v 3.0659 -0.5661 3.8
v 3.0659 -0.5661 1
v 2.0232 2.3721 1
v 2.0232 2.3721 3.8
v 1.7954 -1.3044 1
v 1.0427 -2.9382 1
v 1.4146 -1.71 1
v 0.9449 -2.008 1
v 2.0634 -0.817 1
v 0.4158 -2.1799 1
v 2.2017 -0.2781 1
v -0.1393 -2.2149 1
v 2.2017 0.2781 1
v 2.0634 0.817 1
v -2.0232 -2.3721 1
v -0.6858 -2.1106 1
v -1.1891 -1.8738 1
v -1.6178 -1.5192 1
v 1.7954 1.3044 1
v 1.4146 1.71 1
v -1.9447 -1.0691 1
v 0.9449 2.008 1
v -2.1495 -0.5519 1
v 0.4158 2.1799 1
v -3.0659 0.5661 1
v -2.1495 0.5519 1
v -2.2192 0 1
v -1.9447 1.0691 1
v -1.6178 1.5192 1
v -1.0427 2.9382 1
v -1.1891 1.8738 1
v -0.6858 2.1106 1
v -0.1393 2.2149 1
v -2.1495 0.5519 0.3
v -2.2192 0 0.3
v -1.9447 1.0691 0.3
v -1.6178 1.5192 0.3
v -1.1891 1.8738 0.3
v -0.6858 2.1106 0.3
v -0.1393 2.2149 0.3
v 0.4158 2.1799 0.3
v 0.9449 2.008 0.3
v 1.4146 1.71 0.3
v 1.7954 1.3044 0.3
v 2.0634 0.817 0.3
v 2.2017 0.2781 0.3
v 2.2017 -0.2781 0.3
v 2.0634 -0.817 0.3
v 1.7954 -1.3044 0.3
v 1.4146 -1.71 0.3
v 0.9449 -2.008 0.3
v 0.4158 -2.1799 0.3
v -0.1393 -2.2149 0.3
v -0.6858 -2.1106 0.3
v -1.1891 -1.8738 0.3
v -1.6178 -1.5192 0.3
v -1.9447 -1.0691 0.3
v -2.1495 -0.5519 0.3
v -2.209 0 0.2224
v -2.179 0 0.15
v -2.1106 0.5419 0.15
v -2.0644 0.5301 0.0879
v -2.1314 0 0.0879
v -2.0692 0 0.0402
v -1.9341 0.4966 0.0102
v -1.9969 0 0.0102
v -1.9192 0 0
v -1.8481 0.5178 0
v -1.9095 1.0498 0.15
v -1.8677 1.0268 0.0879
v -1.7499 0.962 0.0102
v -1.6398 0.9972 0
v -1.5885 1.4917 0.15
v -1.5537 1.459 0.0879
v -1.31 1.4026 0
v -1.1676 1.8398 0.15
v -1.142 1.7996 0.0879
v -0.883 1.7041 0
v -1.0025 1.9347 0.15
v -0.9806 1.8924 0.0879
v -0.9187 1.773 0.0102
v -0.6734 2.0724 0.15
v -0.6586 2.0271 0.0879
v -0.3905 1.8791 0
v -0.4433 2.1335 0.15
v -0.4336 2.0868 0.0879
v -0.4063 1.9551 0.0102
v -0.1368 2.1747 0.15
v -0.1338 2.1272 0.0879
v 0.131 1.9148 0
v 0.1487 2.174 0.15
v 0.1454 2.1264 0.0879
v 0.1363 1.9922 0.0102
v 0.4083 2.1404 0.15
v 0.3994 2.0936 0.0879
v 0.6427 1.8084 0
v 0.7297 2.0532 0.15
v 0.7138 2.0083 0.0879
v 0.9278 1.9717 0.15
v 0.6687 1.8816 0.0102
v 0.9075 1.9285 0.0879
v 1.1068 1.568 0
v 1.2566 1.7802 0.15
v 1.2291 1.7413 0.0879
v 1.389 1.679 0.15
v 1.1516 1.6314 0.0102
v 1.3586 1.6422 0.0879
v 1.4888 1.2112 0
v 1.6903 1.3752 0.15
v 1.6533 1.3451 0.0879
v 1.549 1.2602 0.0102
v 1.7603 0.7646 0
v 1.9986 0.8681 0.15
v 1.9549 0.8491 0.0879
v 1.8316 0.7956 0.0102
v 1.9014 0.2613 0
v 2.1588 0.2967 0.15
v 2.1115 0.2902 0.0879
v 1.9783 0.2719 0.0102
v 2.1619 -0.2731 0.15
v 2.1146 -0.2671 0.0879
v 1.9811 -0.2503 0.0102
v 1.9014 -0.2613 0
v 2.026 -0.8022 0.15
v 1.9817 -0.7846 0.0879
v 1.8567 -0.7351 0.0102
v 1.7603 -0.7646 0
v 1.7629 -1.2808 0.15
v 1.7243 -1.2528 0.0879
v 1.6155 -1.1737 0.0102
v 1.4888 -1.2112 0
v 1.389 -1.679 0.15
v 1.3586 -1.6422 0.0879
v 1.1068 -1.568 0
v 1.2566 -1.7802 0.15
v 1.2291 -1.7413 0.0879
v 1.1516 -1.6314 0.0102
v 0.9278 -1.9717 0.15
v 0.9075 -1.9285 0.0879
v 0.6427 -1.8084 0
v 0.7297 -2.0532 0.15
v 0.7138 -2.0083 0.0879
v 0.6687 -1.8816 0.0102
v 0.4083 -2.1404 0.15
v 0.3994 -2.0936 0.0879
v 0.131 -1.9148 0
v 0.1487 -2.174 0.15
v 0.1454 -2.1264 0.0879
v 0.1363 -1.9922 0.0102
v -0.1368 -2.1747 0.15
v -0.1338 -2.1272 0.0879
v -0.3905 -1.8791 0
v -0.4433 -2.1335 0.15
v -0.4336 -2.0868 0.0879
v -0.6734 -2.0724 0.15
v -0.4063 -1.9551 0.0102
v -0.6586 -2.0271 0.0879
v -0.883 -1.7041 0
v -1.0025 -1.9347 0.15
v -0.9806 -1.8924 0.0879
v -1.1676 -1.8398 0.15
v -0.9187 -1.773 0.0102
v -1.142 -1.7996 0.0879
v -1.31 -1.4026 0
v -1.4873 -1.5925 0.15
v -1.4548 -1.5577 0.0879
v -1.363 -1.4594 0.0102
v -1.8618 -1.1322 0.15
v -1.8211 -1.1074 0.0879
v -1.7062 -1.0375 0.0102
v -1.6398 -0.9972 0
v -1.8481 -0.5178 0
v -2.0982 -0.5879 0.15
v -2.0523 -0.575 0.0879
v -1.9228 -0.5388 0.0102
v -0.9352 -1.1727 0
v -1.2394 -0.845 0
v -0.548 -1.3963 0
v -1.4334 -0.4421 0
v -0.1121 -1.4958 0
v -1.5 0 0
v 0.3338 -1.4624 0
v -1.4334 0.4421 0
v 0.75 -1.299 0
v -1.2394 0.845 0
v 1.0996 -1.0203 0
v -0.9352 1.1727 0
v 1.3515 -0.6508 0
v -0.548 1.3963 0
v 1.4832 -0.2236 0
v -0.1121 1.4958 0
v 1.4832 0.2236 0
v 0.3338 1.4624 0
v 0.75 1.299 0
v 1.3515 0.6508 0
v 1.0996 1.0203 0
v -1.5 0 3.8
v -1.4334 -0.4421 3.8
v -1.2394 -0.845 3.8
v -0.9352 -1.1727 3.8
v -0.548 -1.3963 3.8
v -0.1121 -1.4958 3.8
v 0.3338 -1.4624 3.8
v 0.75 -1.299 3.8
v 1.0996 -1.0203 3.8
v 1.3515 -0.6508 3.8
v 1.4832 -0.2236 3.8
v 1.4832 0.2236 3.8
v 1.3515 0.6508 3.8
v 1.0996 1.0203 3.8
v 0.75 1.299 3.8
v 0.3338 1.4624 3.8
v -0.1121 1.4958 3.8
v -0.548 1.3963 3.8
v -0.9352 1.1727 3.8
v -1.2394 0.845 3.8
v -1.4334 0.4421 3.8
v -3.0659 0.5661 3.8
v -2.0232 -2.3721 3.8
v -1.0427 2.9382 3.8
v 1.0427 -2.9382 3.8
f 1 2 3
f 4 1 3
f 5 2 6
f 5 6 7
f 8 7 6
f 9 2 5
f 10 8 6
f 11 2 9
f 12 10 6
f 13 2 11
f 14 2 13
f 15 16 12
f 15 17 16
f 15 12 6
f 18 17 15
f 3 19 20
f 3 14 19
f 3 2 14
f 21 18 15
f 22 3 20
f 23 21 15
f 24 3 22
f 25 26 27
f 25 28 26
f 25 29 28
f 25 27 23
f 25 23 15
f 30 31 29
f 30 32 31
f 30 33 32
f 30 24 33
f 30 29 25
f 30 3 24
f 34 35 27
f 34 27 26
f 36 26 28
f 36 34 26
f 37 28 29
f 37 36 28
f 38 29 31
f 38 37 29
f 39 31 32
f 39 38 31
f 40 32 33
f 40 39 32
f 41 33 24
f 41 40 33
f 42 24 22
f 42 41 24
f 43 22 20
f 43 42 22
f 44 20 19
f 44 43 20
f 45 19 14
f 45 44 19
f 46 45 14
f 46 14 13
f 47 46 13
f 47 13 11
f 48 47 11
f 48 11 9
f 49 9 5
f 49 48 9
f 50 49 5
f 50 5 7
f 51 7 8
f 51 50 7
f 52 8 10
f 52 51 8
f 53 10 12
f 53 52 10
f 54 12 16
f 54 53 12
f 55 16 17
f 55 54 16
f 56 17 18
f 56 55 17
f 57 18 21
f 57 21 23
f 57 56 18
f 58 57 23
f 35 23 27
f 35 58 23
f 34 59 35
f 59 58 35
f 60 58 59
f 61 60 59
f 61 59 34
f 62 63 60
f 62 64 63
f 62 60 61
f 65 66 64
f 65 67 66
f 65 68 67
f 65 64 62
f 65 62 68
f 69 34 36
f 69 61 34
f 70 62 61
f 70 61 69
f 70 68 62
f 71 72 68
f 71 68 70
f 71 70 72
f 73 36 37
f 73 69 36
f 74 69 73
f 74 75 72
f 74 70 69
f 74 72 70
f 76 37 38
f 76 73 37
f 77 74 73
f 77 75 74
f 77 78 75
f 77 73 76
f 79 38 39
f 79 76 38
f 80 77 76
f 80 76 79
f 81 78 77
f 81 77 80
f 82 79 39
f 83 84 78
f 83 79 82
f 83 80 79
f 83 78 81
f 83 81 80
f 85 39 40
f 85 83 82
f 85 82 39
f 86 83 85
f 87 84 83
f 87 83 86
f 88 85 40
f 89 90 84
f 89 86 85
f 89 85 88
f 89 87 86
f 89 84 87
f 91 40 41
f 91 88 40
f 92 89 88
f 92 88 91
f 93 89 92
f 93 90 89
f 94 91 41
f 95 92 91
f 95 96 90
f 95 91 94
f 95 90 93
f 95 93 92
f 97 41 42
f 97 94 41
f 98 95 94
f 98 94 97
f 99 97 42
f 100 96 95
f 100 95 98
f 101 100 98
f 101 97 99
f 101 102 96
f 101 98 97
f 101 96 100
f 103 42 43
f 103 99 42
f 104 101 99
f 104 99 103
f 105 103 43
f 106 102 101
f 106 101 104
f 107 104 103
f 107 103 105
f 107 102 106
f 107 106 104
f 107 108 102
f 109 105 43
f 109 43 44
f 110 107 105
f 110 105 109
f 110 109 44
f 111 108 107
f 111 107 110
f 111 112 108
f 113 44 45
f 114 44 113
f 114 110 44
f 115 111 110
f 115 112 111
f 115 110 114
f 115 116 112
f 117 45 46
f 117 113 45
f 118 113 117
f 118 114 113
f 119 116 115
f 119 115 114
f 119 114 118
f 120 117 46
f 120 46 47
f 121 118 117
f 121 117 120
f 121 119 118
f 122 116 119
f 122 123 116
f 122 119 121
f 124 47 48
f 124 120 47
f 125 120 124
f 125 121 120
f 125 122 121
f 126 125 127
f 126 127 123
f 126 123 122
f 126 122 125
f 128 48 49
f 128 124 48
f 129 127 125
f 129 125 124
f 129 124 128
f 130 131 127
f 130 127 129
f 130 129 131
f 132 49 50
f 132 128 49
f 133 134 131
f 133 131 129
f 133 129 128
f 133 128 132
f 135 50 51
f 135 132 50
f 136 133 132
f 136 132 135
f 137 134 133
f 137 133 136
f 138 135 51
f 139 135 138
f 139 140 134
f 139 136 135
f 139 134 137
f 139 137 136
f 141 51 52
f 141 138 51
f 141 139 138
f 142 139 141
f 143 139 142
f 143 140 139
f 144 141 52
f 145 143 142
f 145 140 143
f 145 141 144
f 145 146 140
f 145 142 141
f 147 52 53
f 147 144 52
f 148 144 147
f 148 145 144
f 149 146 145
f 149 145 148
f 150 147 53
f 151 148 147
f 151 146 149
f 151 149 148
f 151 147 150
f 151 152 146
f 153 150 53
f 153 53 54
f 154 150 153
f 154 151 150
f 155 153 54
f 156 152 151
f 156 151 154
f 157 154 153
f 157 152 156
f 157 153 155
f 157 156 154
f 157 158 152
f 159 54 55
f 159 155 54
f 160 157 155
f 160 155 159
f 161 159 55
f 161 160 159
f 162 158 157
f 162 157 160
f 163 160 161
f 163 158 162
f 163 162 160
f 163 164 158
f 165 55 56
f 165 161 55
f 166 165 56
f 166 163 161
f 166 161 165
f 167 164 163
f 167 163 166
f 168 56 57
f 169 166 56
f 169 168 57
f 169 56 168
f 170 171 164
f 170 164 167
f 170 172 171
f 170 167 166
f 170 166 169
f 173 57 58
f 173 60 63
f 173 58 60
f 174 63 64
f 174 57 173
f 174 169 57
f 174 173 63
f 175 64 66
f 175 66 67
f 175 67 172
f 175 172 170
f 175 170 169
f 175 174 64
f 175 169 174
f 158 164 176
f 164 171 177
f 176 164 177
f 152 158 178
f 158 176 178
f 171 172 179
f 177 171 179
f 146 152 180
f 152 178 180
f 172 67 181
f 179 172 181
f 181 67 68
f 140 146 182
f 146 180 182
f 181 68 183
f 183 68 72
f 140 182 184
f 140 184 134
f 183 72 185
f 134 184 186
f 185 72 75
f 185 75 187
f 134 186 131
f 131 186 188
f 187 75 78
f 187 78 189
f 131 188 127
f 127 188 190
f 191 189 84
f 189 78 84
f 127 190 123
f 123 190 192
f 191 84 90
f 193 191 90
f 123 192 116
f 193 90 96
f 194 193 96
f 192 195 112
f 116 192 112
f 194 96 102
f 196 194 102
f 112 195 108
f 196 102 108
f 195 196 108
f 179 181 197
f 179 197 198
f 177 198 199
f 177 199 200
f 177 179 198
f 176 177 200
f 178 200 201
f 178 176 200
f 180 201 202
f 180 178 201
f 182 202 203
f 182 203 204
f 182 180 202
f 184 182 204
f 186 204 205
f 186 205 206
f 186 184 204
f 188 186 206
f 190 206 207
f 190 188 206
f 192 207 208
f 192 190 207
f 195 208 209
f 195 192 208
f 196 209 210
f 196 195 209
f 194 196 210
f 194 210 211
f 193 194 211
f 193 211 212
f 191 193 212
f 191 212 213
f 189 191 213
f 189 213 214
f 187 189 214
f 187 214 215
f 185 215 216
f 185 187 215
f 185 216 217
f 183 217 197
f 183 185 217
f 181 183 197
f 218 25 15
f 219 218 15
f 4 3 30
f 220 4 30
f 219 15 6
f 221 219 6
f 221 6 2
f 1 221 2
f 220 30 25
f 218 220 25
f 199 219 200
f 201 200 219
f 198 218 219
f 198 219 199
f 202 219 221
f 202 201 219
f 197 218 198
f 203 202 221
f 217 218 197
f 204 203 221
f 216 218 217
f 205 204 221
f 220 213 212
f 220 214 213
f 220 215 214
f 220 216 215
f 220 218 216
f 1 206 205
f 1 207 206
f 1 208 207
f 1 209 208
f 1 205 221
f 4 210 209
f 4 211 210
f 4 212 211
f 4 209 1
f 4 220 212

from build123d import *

# Parameters (mm, degrees)
SKETCH_1_R          = 1.5
EXTRUDE_1_DEPTH     = 3.8
SKETCH_2_OUTSIDE_W  = 9.992
SKETCH_2_OUTSIDE_H  = 9.736
SKETCH_2_OUTSIDE_R  = 2.219238474
CUT_EXTRUDE_1_DEPTH = 1
FILLET_1_R          = 0.3


with BuildPart() as part:
    # 草图1 → 凸台-拉伸1 (new body)
    with BuildSketch(Plane.XY):
        Polygon((-1.042677443, 2.938166733), (-3.065865753, 0.566098213), (-2.02318831, -2.37206852), (1.042677443, -2.938166733), (3.065865753, -0.566098213), (2.02318831, 2.37206852), align=None)
        with Locations(Location((0, 0, 0), (0, 0, 180))):
            Circle(SKETCH_1_R, mode=Mode.SUBTRACT)
    extrude(amount=EXTRUDE_1_DEPTH)

    # 草图2 outside → 切除-拉伸1 (cut)
    with BuildSketch(Plane(origin=(0, 0, 0), x_dir=(-1, 0, 0), z_dir=(0, 0, -1))):
        Rectangle(SKETCH_2_OUTSIDE_W, SKETCH_2_OUTSIDE_H)
        Circle(SKETCH_2_OUTSIDE_R, mode=Mode.SUBTRACT)
    extrude(amount=-CUT_EXTRUDE_1_DEPTH, mode=Mode.SUBTRACT)

    # 圆角1
    fillet_1_edges = [part.edges().sort_by_distance(p)[0] for p in [
        (2.219238474, 0, 0),
    ]]
    fillet(fillet_1_edges, radius=FILLET_1_R)


solid = part.part
